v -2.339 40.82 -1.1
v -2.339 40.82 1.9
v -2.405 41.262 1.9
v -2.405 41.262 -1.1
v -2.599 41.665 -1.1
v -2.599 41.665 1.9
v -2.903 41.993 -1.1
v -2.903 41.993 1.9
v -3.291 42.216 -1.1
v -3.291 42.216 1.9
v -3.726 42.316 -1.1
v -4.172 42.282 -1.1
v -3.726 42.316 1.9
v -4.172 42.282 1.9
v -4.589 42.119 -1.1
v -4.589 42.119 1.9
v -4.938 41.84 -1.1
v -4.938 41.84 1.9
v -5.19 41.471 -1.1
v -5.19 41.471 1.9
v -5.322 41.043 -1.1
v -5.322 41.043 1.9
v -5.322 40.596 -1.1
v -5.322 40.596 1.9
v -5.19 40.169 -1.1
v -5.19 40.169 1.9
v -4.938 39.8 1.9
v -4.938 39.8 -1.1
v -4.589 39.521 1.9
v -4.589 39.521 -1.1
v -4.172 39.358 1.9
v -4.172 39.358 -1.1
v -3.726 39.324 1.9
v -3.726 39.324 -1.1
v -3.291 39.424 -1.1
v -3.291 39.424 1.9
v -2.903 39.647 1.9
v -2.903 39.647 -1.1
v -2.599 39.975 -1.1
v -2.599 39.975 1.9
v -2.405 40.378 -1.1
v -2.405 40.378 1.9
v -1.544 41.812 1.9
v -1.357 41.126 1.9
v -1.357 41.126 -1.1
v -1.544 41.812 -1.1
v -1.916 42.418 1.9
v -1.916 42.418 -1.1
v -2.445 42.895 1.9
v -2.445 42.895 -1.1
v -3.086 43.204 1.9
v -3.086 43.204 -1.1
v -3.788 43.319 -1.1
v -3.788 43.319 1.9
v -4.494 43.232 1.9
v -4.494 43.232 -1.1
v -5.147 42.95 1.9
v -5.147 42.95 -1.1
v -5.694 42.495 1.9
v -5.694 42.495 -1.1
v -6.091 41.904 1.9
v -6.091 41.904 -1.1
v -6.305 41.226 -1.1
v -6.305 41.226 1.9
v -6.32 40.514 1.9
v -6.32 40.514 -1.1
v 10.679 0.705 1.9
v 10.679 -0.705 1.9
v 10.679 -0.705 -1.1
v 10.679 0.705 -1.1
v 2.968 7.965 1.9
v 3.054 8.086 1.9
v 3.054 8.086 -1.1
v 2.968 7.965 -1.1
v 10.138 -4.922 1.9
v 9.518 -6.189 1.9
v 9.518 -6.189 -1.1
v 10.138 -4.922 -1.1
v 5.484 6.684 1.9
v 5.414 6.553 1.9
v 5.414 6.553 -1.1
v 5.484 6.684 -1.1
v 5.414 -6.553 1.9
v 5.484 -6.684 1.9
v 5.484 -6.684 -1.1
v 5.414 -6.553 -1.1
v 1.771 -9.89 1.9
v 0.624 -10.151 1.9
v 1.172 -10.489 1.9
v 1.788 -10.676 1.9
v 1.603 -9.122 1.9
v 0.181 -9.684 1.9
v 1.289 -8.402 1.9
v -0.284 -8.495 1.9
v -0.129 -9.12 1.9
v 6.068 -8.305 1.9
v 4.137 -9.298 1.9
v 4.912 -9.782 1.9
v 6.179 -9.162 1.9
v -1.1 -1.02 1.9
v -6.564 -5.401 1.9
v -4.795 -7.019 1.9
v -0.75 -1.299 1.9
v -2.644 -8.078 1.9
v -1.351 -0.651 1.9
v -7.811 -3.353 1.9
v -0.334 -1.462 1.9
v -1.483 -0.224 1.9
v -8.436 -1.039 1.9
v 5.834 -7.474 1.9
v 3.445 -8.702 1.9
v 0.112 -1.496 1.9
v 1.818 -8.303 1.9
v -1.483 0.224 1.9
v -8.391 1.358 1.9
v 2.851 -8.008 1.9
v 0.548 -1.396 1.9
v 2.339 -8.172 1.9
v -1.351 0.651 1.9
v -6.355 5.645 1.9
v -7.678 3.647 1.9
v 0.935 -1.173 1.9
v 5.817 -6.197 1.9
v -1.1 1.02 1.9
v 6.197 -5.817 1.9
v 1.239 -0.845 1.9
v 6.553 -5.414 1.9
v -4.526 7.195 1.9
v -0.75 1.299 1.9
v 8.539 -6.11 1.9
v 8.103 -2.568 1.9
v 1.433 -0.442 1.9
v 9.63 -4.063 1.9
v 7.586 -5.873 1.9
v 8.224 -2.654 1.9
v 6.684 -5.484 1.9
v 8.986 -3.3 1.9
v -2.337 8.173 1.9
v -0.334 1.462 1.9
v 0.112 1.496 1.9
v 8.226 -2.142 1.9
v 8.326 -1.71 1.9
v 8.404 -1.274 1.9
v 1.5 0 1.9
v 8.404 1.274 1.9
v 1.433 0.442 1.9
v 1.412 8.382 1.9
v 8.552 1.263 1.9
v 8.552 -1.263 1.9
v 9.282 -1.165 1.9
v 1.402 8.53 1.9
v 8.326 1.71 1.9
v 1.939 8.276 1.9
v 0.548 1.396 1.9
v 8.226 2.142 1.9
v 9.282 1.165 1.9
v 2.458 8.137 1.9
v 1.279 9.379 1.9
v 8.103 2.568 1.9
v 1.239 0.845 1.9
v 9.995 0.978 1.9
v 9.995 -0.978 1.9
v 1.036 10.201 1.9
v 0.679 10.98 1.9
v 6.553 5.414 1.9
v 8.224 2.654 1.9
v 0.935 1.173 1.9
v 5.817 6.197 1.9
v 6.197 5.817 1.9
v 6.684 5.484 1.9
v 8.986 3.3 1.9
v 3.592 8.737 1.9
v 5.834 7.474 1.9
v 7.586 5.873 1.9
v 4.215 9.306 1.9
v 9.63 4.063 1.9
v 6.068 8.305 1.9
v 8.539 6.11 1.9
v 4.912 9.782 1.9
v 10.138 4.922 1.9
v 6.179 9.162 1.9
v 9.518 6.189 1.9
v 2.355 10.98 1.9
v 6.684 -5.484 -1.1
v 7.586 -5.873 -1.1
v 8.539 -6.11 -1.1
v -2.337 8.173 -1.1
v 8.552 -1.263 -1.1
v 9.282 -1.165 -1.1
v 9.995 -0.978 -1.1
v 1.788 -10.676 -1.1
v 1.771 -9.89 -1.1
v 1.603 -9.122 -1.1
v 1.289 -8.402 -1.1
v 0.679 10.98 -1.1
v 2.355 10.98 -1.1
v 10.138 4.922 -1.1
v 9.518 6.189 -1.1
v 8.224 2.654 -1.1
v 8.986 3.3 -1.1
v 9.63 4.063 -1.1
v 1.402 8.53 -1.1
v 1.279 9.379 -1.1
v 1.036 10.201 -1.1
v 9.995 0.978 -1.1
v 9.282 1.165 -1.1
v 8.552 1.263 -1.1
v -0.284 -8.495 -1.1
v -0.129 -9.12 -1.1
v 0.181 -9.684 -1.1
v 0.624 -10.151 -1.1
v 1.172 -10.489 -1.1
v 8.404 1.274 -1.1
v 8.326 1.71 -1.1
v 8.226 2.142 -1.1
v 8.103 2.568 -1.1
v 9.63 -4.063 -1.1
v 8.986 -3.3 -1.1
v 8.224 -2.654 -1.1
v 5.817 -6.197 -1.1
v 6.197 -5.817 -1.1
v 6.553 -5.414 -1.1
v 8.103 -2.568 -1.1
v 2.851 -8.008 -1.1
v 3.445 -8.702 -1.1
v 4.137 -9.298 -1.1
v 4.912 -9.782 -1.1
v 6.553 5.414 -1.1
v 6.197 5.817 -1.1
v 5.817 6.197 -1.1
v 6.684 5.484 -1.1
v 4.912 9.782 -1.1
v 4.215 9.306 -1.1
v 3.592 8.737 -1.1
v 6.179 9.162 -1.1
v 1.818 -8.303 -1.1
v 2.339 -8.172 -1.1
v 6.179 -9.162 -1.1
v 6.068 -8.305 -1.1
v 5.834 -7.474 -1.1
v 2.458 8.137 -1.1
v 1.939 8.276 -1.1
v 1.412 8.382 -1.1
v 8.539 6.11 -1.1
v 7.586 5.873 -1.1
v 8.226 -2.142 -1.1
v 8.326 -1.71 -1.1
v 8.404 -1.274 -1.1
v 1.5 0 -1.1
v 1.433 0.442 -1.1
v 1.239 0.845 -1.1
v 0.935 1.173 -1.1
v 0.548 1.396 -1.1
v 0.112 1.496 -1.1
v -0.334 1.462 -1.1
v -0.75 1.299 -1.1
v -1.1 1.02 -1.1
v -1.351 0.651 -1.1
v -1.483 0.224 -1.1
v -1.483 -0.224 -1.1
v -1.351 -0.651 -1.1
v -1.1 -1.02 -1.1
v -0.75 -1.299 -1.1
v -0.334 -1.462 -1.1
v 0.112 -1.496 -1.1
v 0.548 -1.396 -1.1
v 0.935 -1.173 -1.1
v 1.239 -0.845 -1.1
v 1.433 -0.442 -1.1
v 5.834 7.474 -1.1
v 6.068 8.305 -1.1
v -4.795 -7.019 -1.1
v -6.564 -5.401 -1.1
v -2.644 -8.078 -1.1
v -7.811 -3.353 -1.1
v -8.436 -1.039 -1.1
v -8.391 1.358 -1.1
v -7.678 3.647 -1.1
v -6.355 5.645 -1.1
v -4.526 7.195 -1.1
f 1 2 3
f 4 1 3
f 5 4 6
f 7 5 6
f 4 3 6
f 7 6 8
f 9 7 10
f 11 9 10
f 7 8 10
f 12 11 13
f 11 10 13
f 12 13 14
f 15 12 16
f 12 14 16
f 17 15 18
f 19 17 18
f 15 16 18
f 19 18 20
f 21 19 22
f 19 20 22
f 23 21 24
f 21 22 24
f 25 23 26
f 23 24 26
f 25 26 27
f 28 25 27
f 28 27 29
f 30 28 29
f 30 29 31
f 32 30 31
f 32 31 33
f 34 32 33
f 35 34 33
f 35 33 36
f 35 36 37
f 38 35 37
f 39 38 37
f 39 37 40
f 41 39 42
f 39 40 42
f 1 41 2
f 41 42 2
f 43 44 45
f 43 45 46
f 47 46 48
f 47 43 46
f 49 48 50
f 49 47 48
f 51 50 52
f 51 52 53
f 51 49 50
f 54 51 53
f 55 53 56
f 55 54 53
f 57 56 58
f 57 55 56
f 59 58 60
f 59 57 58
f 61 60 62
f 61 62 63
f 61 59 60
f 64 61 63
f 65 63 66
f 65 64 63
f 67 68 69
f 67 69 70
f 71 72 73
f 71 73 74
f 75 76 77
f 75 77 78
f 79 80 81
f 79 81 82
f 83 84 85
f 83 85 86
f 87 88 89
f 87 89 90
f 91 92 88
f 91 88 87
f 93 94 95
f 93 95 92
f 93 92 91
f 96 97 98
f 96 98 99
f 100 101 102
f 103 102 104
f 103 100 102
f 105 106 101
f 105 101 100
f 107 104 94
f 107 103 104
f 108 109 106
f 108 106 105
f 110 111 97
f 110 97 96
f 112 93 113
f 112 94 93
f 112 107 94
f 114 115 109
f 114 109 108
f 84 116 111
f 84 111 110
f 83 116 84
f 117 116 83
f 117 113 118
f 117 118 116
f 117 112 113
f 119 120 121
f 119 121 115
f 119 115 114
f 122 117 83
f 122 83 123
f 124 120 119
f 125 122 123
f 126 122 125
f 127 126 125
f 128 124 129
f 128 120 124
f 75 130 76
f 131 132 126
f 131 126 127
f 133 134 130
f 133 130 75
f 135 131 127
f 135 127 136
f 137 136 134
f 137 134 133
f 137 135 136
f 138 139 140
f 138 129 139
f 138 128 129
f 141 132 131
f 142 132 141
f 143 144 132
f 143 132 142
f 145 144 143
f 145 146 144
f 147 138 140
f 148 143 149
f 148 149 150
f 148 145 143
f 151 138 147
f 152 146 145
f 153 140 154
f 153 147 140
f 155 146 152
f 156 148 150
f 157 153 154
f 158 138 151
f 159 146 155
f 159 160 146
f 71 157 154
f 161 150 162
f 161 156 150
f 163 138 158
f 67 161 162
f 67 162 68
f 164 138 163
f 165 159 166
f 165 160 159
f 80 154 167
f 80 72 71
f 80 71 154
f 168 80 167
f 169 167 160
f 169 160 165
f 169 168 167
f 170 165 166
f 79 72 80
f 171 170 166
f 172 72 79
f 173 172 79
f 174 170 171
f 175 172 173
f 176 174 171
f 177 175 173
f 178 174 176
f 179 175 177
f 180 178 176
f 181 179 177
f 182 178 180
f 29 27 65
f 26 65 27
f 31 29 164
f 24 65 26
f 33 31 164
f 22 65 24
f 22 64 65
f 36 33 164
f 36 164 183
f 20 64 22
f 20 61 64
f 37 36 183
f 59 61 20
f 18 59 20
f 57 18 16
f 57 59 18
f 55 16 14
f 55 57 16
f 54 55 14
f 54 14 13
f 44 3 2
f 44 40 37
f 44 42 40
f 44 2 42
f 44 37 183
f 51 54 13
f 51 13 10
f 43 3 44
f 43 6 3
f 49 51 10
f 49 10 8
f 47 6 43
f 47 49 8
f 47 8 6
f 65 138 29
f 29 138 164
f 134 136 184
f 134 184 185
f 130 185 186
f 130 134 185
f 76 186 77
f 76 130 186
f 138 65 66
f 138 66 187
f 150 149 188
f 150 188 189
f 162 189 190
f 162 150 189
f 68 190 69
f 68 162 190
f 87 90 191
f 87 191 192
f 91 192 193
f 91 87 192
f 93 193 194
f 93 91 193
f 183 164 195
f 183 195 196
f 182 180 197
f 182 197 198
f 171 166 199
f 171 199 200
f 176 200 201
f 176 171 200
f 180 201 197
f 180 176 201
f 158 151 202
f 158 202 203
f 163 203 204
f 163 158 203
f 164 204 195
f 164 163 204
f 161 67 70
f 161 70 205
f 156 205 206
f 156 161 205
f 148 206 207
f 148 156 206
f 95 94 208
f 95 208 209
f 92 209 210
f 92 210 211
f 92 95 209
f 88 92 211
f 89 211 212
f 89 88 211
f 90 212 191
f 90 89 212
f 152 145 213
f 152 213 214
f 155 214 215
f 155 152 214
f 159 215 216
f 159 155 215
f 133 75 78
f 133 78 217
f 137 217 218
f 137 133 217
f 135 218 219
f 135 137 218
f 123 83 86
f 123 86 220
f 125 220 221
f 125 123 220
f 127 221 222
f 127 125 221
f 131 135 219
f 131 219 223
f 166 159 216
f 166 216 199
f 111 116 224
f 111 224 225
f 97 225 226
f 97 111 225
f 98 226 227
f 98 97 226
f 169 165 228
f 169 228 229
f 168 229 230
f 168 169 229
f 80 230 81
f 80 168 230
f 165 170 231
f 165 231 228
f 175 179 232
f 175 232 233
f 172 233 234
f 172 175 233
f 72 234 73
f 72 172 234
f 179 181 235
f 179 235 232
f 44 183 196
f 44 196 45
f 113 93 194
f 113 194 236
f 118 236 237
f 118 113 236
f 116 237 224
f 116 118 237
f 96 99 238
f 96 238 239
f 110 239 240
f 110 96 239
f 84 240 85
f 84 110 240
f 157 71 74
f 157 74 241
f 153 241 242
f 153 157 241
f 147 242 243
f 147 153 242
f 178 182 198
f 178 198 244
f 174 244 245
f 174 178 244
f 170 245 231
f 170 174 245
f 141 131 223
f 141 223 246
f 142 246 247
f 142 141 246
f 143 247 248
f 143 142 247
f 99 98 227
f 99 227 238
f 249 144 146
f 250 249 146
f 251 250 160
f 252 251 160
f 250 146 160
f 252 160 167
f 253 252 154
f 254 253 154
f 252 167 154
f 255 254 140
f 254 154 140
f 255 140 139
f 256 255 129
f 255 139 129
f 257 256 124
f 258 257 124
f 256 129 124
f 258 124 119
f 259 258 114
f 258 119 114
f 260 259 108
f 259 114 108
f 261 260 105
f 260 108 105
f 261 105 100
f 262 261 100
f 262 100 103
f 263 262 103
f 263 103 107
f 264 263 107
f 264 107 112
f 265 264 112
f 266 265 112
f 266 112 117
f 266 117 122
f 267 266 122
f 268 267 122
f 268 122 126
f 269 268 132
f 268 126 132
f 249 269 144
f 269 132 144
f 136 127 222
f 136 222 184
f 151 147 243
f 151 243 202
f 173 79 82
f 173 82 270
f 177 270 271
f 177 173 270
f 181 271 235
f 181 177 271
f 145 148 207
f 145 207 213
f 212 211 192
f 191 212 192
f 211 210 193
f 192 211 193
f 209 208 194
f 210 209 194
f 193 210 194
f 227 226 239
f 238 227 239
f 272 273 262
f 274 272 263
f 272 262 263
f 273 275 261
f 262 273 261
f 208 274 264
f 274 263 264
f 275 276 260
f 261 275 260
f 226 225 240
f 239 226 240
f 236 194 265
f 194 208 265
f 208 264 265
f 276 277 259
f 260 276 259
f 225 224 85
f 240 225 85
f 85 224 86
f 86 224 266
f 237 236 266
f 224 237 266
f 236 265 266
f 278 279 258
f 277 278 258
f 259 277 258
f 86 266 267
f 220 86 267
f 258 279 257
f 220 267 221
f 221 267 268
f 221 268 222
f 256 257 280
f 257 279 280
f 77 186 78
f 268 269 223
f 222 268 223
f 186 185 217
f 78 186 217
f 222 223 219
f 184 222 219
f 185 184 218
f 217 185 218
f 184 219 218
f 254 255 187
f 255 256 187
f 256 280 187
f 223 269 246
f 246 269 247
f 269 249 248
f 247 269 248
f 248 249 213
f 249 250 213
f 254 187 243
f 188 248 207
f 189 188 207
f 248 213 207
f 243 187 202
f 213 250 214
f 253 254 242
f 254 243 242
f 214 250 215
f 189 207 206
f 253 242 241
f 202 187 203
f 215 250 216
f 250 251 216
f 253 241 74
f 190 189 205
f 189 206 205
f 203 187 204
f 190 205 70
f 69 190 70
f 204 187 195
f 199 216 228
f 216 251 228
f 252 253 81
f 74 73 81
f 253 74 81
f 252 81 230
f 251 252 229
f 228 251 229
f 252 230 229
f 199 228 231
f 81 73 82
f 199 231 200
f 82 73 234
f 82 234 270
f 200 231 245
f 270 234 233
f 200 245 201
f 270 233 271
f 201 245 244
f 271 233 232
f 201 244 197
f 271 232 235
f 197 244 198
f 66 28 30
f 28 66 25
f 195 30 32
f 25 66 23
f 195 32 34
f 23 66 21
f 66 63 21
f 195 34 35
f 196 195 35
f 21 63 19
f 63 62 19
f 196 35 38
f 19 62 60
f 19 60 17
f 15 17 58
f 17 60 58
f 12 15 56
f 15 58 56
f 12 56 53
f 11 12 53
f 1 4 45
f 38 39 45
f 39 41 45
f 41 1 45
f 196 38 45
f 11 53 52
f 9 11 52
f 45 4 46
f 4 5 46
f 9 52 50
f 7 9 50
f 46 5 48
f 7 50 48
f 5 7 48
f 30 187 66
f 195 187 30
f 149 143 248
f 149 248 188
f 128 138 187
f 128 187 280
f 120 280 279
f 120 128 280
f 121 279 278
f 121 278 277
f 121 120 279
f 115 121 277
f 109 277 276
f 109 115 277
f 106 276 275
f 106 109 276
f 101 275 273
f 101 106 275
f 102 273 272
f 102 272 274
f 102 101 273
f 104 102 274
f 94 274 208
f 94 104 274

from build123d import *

# Parameters (mm, degrees)
SKETCH1_R           = 1.5
BOSS_EXTRUDE1_DEPTH = 3


with BuildPart() as part:
    # Sketch1 → Boss-Extrude1 (new body)
    with BuildSketch(Plane.XY.offset(1.9)):
        with BuildLine():
            Line((-6.319804534, 40.514327491), (-2.33662546, 8.172526015))
            ThreePointArc((-2.33662546, 8.172526015), (-8.436254395, -1.03904369), (-0.283752271, -8.495262483))
            ThreePointArc((-0.283752271, -8.495262483), (0.387258031, -9.932027081), (1.787569077, -10.676121371))
            ThreePointArc((1.787569077, -10.676121371), (1.706000613, -9.502192185), (1.28944453, -8.401626795))
            ThreePointArc((1.28944453, -8.401626795), (2.079332338, -8.241745994), (2.850528183, -8.007776788))
            ThreePointArc((2.850528183, -8.007776788), (3.779603703, -9.013165462), (4.91238571, -9.781795823))
            Line((4.91238571, -9.781795823), (6.178855756, -9.161994546))
            ThreePointArc((6.178855756, -9.161994546), (5.965894349, -7.885306169), (5.484085843, -6.683995909))
            Line((5.484085843, -6.683995909), (5.414116812, -6.552658937))
            ThreePointArc((5.414116812, -6.552658937), (6.01040764, -6.01040764), (6.552658937, -5.414116812))
            Line((6.552658937, -5.414116812), (6.683995909, -5.484085843))
            ThreePointArc((6.683995909, -5.484085843), (8.057590144, -6.011450066), (9.518230762, -6.188659346))
            Line((9.518230762, -6.188659346), (10.138032038, -4.922189299))
            ThreePointArc((10.138032038, -4.922189299), (9.323454041, -3.667986658), (8.224003874, -2.65419629))
            Line((8.224003874, -2.65419629), (8.102883181, -2.567739114))
            ThreePointArc((8.102883181, -2.567739114), (8.278718168, -1.926869349), (8.403949047, -1.274221493))
            Line((8.403949047, -1.274221493), (8.552369893, -1.263436399))
            ThreePointArc((8.552369893, -1.263436399), (9.641452494, -1.082458564), (10.678939324, -0.705))
            Line((10.678939324, -0.705), (10.678939324, 0.705))
            ThreePointArc((10.678939324, 0.705), (9.641452494, 1.082458564), (8.552369893, 1.263436399))
            Line((8.552369893, 1.263436399), (8.403949047, 1.274221493))
            ThreePointArc((8.403949047, 1.274221493), (8.278718168, 1.926869349), (8.102883181, 2.567739114))
            Line((8.102883181, 2.567739114), (8.224003874, 2.65419629))
            ThreePointArc((8.224003874, 2.65419629), (9.323454041, 3.667986658), (10.138032038, 4.922189299))
            Line((10.138032038, 4.922189299), (9.518230762, 6.188659346))
            ThreePointArc((9.518230762, 6.188659346), (8.057590144, 6.011450066), (6.683995909, 5.484085843))
            Line((6.683995909, 5.484085843), (6.552658937, 5.414116812))
            ThreePointArc((6.552658937, 5.414116812), (6.01040764, 6.01040764), (5.414116812, 6.552658937))
            Line((5.414116812, 6.552658937), (5.484085843, 6.683995909))
            ThreePointArc((5.484085843, 6.683995909), (5.965894349, 7.885306169), (6.178855756, 9.161994546))
            Line((6.178855756, 9.161994546), (4.91238571, 9.781795823))
            ThreePointArc((4.91238571, 9.781795823), (3.893417709, 9.032482418), (3.054167872, 8.08621286))
            Line((3.054167872, 8.08621286), (2.967710696, 7.965092167))
            ThreePointArc((2.967710696, 7.965092167), (2.199961883, 8.210369523), (1.41243323, 8.381827508))
            Line((1.41243323, 8.381827508), (1.401648136, 8.530248353))
            ThreePointArc((1.401648136, 8.530248353), (1.171954356, 9.79405056), (0.678518537, 10.980000113))
            Line((0.678518537, 10.980000113), (2.3553868, 10.980000113))
            Line((2.3553868, 10.980000113), (-1.357298788, 41.125503992))
            ThreePointArc((-1.357298788, 41.125503992), (-4.144139911, 43.301168615), (-6.319804534, 40.514327491))
        make_face()
        with Locations((-3.838551661, 40.819915742)):
            Circle(SKETCH1_R, mode=Mode.SUBTRACT)
        Circle(SKETCH1_R, mode=Mode.SUBTRACT)
    extrude(amount=-BOSS_EXTRUDE1_DEPTH)


solid = part.part
